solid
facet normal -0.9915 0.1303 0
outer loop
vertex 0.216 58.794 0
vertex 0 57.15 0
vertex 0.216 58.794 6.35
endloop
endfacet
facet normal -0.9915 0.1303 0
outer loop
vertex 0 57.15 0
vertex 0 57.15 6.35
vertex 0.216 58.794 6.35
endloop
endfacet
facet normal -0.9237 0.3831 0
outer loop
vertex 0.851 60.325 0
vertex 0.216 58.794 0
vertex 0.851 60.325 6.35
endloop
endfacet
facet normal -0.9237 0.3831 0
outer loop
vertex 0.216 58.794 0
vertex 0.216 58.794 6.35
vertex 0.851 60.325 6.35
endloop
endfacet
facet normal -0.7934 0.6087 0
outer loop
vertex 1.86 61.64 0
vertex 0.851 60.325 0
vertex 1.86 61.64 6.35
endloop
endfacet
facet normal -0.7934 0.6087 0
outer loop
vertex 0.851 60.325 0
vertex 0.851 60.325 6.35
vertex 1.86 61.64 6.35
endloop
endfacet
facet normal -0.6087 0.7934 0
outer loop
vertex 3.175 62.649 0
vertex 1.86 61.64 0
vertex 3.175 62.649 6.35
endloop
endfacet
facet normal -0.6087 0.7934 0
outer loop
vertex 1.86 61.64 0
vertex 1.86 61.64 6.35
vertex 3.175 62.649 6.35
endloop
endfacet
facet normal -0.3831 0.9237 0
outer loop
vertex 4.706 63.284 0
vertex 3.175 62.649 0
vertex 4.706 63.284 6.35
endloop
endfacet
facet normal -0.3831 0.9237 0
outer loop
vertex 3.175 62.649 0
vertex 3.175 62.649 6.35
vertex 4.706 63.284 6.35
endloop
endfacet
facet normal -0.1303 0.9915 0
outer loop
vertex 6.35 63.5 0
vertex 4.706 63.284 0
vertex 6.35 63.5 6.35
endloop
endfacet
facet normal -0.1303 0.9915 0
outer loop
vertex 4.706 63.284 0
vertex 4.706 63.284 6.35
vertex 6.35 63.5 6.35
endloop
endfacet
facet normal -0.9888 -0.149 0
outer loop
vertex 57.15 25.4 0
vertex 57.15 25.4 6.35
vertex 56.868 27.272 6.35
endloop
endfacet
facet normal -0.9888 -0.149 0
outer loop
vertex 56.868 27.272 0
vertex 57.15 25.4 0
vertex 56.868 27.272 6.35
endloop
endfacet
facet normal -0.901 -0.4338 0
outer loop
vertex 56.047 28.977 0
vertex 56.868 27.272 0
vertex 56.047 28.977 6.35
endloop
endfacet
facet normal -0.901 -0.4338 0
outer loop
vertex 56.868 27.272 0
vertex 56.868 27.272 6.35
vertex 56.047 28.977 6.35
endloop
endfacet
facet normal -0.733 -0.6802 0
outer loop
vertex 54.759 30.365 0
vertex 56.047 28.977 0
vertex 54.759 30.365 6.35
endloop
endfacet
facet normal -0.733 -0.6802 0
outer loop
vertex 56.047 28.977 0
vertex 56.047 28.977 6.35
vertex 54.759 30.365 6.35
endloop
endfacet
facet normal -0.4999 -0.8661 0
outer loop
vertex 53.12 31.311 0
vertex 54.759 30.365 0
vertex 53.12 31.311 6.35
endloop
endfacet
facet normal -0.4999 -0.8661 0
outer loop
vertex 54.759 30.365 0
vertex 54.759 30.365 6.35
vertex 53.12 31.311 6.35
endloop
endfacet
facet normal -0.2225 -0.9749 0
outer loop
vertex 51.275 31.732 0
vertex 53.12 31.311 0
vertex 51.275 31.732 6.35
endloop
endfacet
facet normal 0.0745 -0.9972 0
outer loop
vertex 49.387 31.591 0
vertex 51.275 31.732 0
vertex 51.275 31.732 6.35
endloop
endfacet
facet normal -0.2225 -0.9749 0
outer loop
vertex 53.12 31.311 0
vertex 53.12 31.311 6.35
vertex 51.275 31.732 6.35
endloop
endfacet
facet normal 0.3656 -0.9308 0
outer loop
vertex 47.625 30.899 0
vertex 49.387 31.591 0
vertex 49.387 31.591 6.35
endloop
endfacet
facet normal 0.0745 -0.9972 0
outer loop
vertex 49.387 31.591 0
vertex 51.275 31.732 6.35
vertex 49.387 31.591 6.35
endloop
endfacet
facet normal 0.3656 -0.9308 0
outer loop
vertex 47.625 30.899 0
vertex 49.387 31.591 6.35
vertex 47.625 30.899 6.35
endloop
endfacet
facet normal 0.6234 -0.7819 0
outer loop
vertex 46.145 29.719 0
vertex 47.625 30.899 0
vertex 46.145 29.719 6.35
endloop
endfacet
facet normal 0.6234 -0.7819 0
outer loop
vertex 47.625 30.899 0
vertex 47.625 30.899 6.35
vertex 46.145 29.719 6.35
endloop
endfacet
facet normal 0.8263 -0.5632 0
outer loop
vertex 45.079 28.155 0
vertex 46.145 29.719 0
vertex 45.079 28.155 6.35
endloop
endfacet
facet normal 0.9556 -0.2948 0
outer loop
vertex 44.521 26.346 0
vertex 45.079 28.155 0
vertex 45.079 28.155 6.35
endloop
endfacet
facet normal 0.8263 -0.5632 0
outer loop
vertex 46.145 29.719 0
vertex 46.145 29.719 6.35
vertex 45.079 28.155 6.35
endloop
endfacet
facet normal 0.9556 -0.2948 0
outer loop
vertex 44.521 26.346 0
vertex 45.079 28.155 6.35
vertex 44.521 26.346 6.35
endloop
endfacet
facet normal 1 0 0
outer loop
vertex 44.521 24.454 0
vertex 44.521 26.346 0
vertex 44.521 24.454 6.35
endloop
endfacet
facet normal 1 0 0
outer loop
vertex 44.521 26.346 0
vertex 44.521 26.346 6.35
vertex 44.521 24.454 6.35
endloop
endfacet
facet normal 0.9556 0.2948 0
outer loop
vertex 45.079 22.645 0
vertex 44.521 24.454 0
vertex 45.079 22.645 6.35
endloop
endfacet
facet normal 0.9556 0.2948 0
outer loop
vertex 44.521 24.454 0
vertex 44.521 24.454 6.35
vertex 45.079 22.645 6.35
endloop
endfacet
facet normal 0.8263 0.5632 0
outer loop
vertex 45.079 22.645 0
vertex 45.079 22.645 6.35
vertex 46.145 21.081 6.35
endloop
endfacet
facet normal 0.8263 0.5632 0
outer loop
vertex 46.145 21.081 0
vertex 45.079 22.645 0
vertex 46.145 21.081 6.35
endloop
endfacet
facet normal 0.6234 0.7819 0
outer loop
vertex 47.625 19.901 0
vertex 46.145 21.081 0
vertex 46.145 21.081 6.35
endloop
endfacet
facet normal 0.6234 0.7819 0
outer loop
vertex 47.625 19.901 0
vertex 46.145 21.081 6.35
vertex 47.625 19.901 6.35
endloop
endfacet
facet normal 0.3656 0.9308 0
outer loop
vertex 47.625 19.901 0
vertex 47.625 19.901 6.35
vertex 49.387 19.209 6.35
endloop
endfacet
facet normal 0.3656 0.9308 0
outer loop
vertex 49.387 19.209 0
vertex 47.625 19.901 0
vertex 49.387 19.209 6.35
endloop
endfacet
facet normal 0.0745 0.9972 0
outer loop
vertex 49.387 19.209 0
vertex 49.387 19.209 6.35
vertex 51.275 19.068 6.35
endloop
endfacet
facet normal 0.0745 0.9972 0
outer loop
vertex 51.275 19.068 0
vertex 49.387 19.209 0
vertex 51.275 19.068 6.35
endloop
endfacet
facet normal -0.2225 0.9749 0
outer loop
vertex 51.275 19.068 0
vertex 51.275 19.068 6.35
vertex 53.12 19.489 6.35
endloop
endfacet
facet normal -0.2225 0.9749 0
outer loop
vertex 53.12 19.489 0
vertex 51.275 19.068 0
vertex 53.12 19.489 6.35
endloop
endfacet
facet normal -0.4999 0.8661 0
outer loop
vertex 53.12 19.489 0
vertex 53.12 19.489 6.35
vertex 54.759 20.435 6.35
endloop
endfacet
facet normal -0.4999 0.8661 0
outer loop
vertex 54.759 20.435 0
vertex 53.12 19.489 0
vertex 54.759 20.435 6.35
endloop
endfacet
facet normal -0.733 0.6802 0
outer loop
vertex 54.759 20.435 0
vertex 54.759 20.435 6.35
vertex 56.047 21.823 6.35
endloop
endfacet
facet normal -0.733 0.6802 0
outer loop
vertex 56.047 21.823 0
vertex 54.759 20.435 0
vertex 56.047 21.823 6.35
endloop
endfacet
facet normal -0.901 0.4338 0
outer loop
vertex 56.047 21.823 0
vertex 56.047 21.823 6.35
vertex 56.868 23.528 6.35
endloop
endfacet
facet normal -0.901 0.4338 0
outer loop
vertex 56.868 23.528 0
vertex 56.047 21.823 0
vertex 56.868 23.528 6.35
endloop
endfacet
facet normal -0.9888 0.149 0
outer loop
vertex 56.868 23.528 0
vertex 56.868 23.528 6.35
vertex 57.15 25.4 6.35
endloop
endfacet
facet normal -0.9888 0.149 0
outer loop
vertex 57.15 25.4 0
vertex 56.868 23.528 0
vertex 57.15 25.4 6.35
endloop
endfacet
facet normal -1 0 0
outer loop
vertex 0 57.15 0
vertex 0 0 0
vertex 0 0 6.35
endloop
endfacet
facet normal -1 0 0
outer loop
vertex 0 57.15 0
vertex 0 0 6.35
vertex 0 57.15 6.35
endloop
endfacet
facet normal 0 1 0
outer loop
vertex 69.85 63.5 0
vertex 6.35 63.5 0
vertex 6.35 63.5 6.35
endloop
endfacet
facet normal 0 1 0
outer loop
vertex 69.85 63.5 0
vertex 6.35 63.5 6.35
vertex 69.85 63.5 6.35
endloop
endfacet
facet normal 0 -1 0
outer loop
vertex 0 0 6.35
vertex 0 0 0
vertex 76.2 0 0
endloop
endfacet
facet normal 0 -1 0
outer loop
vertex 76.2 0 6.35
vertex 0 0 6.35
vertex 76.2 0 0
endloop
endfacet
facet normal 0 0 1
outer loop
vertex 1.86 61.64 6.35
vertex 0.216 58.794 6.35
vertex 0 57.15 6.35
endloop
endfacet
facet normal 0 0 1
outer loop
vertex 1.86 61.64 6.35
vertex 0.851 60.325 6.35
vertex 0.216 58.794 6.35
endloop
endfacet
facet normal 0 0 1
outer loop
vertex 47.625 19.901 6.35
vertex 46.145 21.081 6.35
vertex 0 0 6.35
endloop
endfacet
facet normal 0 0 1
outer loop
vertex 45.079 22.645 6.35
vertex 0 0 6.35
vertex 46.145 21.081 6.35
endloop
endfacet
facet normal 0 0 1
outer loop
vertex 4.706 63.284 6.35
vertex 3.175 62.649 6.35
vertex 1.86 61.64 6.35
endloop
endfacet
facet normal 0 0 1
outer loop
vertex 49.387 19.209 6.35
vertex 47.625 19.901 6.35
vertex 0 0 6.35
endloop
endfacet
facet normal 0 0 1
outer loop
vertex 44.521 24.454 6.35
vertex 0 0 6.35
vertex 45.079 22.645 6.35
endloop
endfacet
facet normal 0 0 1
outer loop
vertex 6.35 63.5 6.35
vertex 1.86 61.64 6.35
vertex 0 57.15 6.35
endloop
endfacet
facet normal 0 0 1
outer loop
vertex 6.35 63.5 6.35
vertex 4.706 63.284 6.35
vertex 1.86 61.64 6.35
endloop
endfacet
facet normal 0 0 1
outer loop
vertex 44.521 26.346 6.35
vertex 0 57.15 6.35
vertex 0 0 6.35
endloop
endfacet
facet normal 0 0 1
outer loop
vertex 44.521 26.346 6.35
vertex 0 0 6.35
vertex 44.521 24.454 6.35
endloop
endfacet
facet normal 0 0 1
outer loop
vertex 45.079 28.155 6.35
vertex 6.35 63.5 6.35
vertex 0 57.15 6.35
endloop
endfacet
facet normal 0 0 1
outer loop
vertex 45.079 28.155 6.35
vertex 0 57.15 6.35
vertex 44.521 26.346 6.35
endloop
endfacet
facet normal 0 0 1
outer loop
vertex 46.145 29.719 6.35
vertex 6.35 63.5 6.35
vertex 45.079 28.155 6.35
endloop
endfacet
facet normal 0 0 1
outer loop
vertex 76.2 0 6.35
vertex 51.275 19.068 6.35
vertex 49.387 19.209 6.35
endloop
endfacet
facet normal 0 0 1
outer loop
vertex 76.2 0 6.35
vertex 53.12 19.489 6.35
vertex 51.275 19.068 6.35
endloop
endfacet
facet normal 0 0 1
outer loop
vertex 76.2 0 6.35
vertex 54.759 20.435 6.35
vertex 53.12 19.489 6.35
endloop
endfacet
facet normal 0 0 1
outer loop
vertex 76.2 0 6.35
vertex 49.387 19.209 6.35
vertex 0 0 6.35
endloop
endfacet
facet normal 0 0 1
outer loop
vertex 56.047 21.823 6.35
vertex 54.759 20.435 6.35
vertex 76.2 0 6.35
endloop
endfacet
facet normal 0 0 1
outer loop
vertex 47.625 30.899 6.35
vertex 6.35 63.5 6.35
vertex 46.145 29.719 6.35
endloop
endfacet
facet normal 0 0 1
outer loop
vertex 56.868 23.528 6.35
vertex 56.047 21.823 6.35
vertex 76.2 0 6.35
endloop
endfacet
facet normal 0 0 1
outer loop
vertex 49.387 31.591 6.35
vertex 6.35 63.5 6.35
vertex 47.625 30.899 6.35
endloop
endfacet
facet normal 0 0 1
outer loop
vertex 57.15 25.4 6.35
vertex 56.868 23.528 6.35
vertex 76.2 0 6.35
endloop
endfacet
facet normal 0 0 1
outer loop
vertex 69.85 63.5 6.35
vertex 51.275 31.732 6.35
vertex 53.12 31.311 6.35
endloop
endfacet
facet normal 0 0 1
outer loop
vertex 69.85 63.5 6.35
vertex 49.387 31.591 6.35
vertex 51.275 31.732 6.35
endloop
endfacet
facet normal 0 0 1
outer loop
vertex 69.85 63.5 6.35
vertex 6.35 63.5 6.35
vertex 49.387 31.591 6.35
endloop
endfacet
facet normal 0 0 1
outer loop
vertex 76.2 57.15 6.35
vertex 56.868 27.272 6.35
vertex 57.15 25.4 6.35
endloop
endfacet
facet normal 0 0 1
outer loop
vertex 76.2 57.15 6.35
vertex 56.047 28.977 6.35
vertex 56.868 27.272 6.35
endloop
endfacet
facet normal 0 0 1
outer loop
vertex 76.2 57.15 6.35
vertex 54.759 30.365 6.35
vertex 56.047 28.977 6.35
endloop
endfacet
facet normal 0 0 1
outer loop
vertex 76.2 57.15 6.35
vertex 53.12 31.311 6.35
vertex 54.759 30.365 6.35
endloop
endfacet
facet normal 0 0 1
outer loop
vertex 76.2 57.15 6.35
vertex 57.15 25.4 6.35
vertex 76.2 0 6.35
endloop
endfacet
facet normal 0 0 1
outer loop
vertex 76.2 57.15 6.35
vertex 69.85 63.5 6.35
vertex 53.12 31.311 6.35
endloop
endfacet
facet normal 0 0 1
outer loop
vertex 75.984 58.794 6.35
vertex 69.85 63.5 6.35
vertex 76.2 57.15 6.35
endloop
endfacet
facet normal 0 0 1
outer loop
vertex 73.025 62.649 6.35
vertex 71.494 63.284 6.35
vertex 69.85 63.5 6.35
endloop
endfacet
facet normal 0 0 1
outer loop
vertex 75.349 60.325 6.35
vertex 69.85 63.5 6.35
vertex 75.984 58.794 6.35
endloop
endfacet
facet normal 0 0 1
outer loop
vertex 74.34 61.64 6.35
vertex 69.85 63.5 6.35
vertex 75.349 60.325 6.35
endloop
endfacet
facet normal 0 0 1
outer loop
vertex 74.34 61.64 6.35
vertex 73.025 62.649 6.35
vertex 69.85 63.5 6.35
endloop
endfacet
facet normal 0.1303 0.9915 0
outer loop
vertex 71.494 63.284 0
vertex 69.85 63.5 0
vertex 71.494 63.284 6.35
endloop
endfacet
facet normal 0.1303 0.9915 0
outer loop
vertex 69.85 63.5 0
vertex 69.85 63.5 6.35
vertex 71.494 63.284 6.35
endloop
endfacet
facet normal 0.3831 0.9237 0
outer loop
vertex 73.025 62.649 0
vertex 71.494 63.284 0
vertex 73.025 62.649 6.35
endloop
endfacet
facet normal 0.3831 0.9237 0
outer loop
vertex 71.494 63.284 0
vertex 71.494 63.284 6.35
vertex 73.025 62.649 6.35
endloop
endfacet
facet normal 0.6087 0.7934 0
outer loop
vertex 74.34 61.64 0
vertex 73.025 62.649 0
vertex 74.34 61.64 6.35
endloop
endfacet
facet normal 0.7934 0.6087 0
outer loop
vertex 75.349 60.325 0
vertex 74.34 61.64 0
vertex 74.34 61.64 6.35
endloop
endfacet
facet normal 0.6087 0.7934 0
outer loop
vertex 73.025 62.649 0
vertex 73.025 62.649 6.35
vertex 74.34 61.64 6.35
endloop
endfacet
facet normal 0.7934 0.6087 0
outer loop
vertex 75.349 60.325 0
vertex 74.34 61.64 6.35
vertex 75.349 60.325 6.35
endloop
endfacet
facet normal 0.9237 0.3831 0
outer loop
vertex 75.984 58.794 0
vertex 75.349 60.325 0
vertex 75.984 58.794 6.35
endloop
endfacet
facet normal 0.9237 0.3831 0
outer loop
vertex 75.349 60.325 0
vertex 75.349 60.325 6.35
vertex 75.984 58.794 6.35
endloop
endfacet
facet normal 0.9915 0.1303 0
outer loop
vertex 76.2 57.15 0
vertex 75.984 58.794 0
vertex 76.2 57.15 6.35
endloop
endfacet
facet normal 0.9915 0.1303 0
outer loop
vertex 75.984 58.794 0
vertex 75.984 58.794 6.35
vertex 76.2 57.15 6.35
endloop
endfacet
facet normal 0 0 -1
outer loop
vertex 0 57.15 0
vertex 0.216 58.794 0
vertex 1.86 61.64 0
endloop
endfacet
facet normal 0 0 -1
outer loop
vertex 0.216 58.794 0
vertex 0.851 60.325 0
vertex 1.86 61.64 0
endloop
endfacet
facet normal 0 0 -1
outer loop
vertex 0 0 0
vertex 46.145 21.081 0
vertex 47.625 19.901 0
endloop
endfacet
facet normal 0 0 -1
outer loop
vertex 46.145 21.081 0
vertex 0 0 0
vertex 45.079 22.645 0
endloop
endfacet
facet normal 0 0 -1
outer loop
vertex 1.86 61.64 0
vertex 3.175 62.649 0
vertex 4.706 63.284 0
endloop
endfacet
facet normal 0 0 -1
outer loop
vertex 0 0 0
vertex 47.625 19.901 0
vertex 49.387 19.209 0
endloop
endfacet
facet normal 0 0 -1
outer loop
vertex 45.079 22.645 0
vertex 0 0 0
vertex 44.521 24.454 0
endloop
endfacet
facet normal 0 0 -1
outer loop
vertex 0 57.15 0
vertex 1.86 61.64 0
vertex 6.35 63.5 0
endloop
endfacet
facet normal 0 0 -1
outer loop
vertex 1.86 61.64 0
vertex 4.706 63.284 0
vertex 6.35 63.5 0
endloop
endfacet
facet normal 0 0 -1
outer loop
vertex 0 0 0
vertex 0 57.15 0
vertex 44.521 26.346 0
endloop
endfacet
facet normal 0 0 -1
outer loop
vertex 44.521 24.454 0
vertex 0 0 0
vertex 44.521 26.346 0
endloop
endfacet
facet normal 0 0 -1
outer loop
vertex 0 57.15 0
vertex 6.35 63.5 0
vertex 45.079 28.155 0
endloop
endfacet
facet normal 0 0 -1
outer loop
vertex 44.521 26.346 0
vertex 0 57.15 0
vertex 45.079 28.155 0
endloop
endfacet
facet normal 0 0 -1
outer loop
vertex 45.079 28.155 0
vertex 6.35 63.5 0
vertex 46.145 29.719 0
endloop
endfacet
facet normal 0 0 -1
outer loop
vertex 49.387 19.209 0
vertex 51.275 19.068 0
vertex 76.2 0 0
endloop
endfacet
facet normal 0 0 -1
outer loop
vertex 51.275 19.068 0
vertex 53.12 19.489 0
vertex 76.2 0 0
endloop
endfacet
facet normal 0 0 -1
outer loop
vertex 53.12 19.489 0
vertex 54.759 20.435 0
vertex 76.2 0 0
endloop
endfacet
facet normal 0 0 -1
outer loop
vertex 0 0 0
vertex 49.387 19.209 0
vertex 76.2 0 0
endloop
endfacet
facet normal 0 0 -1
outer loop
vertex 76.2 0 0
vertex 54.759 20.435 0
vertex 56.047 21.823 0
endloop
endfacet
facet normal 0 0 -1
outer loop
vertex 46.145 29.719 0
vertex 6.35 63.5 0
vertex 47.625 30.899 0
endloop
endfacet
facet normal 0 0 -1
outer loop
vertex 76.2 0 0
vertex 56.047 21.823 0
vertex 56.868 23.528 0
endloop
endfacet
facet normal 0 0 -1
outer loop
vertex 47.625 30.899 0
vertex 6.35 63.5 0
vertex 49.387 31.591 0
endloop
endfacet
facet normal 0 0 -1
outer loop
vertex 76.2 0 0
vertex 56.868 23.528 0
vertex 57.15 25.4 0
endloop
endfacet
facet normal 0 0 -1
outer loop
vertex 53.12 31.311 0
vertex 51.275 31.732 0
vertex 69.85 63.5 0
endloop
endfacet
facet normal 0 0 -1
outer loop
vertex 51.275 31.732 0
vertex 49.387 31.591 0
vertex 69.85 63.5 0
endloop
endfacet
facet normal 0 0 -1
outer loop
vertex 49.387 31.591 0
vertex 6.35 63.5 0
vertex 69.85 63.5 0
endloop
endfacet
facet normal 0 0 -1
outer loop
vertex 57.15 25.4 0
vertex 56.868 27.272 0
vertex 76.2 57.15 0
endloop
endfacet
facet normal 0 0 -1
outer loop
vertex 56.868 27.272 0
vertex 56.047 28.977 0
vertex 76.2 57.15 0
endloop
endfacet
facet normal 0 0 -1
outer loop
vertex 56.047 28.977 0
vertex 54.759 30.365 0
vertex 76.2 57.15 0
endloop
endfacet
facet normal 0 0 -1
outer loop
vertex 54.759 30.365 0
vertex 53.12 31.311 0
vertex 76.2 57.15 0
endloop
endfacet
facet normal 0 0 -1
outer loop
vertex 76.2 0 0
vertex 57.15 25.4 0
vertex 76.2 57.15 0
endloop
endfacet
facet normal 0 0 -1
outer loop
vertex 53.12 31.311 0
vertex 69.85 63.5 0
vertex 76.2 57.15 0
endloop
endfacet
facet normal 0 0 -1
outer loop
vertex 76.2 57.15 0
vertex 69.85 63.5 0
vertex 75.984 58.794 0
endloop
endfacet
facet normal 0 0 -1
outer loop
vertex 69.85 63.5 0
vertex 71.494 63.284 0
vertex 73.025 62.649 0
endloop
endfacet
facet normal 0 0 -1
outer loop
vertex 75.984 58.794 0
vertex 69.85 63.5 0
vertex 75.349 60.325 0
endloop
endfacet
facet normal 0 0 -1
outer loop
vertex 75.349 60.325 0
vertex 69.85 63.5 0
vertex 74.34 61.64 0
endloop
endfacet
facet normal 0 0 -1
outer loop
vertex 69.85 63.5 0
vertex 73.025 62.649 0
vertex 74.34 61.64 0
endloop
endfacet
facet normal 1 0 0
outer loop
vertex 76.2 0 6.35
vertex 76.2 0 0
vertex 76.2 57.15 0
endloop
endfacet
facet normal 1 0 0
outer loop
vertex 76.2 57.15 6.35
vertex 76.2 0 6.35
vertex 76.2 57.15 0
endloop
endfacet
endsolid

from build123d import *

# Parameters (mm, degrees)
SKETCH1_W           = 76.2
SKETCH1_H           = 63.5
BOSS_EXTRUDE1_DEPTH = 6.35
FILLET1_R           = 6.35
FILLET2_R           = 6.35
SKETCH2_R           = 6.35
CUT_EXTRUDE1_DEPTH  = 7.35


with BuildPart() as part:
    # Sketch1 → Boss-Extrude1 (new body)
    with BuildSketch(Plane.XY):
        with Locations((38.1, 31.75)):
            Rectangle(SKETCH1_W, SKETCH1_H)
    extrude(amount=BOSS_EXTRUDE1_DEPTH)

    # Fillet1
    fillet1_edges = [part.edges().sort_by_distance(p)[0] for p in [
        (0, 63.5, 3.175),
    ]]
    fillet(fillet1_edges, radius=FILLET1_R)

    # Fillet2
    fillet2_edges = [part.edges().sort_by_distance(p)[0] for p in [
        (76.2, 63.5, 3.175),
    ]]
    fillet(fillet2_edges, radius=FILLET2_R)

    # Sketch2 → Cut-Extrude1 (cut, through all)
    with BuildSketch(Plane.XY.offset(6.35)):
        with Locations((50.8, 25.4)):
            Circle(SKETCH2_R)
    extrude(amount=-CUT_EXTRUDE1_DEPTH, mode=Mode.SUBTRACT)


solid = part.part
